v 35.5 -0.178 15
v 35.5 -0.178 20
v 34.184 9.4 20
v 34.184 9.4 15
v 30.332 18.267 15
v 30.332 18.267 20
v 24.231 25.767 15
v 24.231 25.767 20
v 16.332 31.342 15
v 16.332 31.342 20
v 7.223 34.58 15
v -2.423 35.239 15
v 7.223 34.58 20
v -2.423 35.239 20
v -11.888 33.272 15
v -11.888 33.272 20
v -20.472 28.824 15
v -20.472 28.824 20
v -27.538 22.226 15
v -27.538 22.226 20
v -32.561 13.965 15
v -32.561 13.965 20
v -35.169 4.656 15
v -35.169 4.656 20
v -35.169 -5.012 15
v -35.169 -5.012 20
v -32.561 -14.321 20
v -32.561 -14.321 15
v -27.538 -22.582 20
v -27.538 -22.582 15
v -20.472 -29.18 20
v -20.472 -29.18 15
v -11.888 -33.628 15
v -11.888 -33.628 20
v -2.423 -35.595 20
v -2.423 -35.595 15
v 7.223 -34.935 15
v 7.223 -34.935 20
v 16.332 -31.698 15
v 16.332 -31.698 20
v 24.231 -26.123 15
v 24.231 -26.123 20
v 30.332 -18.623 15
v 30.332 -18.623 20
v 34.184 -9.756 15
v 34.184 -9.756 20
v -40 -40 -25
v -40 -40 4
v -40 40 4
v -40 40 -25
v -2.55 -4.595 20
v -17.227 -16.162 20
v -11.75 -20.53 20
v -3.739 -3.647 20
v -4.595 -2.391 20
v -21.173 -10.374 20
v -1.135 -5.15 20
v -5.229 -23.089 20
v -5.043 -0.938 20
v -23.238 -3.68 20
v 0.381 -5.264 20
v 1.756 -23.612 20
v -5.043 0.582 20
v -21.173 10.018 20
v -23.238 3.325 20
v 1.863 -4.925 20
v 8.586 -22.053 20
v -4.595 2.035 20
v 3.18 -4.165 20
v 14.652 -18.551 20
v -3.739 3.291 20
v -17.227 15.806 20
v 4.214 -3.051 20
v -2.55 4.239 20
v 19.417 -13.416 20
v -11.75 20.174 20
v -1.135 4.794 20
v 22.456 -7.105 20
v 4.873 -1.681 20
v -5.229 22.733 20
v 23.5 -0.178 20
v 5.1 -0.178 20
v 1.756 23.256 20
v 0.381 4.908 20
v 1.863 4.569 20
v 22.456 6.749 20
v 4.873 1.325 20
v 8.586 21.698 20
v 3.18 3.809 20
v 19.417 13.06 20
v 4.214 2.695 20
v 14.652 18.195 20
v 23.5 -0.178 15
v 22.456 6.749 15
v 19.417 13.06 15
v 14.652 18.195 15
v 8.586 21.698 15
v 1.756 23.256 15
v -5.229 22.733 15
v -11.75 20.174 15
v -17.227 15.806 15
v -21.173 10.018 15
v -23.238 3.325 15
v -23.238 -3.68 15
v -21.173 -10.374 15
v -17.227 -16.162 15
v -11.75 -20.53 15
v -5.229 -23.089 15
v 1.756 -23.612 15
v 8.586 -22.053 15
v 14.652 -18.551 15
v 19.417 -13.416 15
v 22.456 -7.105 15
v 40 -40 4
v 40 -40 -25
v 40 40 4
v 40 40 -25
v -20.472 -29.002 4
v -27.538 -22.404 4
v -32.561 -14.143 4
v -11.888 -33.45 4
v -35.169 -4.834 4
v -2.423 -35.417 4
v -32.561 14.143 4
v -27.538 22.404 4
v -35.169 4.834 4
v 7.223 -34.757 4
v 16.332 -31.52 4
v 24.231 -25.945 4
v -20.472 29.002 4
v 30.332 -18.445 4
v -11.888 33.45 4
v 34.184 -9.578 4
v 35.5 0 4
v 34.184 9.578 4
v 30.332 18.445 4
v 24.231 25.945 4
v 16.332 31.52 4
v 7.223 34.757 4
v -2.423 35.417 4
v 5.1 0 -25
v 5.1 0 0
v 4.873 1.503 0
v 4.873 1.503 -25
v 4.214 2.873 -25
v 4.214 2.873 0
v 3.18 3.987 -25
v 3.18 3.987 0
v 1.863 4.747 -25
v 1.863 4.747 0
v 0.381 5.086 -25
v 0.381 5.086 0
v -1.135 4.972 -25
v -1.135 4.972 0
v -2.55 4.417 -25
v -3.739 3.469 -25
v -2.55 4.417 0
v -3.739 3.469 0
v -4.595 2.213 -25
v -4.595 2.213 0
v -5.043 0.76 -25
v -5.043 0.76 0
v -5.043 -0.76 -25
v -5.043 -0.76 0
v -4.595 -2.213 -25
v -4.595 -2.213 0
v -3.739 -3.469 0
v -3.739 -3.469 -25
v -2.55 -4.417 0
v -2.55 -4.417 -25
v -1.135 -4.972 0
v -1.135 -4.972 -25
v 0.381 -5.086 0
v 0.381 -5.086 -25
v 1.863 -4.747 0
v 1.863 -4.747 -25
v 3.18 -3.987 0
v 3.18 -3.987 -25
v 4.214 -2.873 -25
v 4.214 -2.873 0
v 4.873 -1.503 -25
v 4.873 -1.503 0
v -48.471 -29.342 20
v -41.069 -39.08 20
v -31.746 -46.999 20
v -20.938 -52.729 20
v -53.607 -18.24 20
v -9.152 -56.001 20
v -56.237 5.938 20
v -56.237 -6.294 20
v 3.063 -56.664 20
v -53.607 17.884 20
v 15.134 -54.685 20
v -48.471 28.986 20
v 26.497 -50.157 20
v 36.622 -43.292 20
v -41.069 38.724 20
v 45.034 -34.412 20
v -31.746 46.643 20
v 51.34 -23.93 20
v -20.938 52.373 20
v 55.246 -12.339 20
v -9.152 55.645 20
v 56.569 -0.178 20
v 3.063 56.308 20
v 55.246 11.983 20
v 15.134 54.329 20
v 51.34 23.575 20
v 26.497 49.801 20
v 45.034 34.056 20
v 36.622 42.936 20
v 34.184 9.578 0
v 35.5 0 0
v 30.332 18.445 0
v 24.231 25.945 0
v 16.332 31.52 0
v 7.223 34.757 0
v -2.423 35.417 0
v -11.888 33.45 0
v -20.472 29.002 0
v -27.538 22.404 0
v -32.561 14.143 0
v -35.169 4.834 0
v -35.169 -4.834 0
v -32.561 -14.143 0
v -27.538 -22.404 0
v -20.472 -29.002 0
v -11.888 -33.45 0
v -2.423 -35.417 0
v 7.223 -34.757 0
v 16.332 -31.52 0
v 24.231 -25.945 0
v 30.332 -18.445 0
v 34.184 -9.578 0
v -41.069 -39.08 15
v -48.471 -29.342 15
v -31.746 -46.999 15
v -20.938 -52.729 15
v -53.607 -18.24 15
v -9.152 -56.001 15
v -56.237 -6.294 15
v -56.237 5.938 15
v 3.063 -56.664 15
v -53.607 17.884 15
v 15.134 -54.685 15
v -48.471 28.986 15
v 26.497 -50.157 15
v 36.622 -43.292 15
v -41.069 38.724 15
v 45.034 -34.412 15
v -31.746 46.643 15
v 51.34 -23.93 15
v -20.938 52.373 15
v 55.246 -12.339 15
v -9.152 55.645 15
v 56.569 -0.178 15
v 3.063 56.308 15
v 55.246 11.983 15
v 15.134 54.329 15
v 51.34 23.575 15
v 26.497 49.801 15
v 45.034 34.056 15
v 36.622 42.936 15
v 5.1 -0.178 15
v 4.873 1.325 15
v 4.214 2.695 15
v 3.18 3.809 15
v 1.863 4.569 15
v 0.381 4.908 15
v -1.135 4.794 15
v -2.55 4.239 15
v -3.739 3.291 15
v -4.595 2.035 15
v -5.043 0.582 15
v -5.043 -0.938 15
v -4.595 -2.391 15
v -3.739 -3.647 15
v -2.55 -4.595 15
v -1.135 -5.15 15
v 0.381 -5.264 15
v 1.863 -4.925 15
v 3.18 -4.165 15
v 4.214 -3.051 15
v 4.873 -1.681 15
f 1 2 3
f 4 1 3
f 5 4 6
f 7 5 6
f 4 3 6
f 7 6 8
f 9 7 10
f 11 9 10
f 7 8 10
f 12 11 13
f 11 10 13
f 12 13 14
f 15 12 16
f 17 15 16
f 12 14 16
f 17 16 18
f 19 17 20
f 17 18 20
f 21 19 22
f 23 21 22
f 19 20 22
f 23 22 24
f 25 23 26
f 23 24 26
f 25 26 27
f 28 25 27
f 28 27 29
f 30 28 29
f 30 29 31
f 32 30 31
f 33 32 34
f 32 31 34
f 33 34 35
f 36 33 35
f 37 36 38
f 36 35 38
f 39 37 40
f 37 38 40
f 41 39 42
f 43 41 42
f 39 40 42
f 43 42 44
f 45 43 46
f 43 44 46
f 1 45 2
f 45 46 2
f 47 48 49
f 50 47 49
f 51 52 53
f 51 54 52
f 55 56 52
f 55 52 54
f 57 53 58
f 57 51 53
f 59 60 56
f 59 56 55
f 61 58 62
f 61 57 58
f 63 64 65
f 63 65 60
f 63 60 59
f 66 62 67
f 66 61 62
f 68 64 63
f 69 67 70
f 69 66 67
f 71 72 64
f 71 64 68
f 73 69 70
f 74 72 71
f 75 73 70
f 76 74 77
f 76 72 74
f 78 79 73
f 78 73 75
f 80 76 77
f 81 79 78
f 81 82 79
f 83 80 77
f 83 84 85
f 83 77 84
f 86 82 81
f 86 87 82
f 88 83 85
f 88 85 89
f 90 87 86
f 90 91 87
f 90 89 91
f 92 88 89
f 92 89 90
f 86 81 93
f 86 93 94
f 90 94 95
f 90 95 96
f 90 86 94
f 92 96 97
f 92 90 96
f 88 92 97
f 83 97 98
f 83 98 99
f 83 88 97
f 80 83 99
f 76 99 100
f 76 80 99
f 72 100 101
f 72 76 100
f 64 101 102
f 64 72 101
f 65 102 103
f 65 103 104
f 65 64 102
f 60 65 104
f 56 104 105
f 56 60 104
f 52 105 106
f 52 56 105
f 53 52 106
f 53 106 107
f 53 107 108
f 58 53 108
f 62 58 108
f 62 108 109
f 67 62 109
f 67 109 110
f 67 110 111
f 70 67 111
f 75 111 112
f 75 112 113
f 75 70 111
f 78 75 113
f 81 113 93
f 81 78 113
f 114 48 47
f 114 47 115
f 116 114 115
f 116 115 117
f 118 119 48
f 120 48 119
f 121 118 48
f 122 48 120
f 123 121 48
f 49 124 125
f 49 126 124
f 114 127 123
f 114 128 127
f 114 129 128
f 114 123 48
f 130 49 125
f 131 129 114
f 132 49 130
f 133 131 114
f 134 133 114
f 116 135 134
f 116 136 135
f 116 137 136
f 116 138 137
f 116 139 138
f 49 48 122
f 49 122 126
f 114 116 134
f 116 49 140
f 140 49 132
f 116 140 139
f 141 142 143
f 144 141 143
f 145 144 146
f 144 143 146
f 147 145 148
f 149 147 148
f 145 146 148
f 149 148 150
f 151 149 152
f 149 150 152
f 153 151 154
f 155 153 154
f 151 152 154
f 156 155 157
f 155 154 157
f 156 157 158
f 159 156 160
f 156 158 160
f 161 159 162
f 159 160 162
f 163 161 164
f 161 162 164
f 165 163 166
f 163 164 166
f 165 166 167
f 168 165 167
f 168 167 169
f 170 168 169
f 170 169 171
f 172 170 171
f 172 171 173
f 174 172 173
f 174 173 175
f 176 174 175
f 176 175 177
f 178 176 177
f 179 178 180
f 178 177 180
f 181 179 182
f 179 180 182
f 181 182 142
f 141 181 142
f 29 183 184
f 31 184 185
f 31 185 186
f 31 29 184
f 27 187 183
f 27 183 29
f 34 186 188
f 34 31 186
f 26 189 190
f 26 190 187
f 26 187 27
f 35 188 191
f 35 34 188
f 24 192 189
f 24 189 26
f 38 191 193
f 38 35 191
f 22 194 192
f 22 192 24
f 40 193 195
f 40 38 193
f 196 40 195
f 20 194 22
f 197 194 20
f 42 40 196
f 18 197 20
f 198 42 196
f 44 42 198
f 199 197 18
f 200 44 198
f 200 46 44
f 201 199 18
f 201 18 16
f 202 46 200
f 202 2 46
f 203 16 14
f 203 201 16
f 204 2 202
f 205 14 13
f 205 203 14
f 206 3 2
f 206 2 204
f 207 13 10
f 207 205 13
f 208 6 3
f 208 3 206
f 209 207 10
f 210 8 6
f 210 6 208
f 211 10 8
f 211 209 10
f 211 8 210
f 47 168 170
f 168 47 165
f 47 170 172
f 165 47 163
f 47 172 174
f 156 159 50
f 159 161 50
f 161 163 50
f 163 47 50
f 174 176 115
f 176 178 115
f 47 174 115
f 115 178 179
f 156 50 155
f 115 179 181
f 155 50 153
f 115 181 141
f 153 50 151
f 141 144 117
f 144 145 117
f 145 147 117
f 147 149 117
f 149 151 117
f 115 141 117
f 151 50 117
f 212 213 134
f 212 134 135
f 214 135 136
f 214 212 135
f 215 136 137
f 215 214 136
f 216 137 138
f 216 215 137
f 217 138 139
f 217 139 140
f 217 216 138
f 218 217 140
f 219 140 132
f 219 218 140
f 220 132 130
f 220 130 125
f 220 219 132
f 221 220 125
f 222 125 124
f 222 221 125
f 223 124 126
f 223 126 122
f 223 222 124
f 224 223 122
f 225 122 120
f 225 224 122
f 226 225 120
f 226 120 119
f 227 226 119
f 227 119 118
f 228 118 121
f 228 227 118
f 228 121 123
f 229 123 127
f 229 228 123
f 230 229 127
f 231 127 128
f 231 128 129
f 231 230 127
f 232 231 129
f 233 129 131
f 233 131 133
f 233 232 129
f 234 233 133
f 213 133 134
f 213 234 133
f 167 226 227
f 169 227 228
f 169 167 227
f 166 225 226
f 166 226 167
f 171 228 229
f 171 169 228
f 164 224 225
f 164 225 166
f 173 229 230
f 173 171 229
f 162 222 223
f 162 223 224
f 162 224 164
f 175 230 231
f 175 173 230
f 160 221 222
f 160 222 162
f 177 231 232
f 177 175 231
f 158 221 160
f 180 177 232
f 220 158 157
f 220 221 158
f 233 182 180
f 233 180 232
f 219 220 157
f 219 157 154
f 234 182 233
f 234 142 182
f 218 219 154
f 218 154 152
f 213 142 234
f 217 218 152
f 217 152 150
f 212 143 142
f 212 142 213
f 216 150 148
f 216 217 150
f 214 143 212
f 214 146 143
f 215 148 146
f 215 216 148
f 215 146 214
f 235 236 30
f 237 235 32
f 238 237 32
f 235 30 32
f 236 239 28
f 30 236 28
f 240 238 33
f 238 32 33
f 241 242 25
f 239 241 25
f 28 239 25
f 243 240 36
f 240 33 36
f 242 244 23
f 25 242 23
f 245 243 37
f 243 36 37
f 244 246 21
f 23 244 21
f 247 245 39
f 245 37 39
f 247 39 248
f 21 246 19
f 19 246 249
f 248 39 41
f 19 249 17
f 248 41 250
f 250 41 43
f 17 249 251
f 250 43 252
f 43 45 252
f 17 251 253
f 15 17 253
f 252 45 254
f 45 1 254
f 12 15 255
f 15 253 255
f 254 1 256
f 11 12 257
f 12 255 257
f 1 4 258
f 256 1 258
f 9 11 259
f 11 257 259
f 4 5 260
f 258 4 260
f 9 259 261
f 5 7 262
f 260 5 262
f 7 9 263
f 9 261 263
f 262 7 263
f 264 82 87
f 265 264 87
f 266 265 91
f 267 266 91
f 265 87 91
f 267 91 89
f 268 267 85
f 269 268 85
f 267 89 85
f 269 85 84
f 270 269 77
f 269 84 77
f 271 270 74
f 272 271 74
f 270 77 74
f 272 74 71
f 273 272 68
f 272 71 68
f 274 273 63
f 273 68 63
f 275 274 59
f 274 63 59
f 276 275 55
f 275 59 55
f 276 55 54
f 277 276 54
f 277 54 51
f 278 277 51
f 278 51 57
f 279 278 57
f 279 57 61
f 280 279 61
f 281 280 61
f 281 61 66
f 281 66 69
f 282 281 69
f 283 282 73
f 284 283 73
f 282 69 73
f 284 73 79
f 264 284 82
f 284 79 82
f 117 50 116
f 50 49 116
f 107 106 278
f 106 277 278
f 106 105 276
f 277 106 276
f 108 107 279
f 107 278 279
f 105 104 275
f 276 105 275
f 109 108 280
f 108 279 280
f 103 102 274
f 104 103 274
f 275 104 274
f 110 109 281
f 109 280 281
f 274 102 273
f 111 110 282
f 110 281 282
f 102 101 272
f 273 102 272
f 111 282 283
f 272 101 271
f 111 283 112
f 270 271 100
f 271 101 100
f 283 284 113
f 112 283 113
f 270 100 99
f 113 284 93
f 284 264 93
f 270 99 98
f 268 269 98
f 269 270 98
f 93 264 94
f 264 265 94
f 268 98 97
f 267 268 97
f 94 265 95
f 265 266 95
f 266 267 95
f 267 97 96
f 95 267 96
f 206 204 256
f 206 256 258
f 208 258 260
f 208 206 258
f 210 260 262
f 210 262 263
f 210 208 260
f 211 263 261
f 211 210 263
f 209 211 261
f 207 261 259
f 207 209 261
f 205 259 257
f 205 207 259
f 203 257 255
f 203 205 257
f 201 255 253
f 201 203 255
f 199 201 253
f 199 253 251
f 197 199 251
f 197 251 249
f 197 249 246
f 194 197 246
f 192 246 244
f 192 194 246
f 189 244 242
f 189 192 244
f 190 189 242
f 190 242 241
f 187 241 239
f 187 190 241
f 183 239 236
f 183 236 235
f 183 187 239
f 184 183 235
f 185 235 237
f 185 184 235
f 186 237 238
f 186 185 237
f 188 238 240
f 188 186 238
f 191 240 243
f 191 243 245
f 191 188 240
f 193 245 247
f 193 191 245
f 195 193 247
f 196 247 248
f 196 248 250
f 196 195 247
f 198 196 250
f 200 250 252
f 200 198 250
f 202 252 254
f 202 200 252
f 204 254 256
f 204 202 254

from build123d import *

# Parameters (mm, degrees)
F0_W     = 80
F0_H     = 80
F0_R     = 35.5
F1_DEPTH = 4
F0_R_2   = 5.1
F2_DEPTH = 25
F4_R     = 56.5685424949
F4_R_2   = 35.5
F5_DEPTH = 5
F4_R_3   = 23.5
F4_R_4   = 5.1


with BuildPart() as f1:
    # F0 (on Top) → F1 (new body)
    with BuildSketch(Plane.XY):
        Rectangle(F0_W, F0_H)
        Circle(F0_R, mode=Mode.SUBTRACT)
    extrude(amount=F1_DEPTH)

    # F0 (on Top) → F2 (join)
    with BuildSketch(Plane.XY):
        Rectangle(F0_W, F0_H)
        Circle(F0_R, mode=Mode.SUBTRACT)
        Circle(F0_R)
        Circle(F0_R_2, mode=Mode.SUBTRACT)
    extrude(amount=-F2_DEPTH)


with BuildPart() as f5:
    # F4 (on offset) → F5 (new body)
    with BuildSketch(Plane.XY.offset(20)):
        with Locations((0, -0.1779661106)):
            Circle(F4_R)
        with Locations((0, -0.1779661106)):
            Circle(F4_R_2, mode=Mode.SUBTRACT)
    extrude(amount=-F5_DEPTH)


with BuildPart() as f5b:
    # F4 (on offset) → F5, piece 2 (new body)
    with BuildSketch(Plane.XY.offset(20)):
        with Locations((0, -0.1779661106)):
            Circle(F4_R_3)
        with Locations((0, -0.1779661106)):
            Circle(F4_R_4, mode=Mode.SUBTRACT)
    extrude(amount=-F5_DEPTH)


solid = Compound([f1.part, f5.part, f5b.part])
